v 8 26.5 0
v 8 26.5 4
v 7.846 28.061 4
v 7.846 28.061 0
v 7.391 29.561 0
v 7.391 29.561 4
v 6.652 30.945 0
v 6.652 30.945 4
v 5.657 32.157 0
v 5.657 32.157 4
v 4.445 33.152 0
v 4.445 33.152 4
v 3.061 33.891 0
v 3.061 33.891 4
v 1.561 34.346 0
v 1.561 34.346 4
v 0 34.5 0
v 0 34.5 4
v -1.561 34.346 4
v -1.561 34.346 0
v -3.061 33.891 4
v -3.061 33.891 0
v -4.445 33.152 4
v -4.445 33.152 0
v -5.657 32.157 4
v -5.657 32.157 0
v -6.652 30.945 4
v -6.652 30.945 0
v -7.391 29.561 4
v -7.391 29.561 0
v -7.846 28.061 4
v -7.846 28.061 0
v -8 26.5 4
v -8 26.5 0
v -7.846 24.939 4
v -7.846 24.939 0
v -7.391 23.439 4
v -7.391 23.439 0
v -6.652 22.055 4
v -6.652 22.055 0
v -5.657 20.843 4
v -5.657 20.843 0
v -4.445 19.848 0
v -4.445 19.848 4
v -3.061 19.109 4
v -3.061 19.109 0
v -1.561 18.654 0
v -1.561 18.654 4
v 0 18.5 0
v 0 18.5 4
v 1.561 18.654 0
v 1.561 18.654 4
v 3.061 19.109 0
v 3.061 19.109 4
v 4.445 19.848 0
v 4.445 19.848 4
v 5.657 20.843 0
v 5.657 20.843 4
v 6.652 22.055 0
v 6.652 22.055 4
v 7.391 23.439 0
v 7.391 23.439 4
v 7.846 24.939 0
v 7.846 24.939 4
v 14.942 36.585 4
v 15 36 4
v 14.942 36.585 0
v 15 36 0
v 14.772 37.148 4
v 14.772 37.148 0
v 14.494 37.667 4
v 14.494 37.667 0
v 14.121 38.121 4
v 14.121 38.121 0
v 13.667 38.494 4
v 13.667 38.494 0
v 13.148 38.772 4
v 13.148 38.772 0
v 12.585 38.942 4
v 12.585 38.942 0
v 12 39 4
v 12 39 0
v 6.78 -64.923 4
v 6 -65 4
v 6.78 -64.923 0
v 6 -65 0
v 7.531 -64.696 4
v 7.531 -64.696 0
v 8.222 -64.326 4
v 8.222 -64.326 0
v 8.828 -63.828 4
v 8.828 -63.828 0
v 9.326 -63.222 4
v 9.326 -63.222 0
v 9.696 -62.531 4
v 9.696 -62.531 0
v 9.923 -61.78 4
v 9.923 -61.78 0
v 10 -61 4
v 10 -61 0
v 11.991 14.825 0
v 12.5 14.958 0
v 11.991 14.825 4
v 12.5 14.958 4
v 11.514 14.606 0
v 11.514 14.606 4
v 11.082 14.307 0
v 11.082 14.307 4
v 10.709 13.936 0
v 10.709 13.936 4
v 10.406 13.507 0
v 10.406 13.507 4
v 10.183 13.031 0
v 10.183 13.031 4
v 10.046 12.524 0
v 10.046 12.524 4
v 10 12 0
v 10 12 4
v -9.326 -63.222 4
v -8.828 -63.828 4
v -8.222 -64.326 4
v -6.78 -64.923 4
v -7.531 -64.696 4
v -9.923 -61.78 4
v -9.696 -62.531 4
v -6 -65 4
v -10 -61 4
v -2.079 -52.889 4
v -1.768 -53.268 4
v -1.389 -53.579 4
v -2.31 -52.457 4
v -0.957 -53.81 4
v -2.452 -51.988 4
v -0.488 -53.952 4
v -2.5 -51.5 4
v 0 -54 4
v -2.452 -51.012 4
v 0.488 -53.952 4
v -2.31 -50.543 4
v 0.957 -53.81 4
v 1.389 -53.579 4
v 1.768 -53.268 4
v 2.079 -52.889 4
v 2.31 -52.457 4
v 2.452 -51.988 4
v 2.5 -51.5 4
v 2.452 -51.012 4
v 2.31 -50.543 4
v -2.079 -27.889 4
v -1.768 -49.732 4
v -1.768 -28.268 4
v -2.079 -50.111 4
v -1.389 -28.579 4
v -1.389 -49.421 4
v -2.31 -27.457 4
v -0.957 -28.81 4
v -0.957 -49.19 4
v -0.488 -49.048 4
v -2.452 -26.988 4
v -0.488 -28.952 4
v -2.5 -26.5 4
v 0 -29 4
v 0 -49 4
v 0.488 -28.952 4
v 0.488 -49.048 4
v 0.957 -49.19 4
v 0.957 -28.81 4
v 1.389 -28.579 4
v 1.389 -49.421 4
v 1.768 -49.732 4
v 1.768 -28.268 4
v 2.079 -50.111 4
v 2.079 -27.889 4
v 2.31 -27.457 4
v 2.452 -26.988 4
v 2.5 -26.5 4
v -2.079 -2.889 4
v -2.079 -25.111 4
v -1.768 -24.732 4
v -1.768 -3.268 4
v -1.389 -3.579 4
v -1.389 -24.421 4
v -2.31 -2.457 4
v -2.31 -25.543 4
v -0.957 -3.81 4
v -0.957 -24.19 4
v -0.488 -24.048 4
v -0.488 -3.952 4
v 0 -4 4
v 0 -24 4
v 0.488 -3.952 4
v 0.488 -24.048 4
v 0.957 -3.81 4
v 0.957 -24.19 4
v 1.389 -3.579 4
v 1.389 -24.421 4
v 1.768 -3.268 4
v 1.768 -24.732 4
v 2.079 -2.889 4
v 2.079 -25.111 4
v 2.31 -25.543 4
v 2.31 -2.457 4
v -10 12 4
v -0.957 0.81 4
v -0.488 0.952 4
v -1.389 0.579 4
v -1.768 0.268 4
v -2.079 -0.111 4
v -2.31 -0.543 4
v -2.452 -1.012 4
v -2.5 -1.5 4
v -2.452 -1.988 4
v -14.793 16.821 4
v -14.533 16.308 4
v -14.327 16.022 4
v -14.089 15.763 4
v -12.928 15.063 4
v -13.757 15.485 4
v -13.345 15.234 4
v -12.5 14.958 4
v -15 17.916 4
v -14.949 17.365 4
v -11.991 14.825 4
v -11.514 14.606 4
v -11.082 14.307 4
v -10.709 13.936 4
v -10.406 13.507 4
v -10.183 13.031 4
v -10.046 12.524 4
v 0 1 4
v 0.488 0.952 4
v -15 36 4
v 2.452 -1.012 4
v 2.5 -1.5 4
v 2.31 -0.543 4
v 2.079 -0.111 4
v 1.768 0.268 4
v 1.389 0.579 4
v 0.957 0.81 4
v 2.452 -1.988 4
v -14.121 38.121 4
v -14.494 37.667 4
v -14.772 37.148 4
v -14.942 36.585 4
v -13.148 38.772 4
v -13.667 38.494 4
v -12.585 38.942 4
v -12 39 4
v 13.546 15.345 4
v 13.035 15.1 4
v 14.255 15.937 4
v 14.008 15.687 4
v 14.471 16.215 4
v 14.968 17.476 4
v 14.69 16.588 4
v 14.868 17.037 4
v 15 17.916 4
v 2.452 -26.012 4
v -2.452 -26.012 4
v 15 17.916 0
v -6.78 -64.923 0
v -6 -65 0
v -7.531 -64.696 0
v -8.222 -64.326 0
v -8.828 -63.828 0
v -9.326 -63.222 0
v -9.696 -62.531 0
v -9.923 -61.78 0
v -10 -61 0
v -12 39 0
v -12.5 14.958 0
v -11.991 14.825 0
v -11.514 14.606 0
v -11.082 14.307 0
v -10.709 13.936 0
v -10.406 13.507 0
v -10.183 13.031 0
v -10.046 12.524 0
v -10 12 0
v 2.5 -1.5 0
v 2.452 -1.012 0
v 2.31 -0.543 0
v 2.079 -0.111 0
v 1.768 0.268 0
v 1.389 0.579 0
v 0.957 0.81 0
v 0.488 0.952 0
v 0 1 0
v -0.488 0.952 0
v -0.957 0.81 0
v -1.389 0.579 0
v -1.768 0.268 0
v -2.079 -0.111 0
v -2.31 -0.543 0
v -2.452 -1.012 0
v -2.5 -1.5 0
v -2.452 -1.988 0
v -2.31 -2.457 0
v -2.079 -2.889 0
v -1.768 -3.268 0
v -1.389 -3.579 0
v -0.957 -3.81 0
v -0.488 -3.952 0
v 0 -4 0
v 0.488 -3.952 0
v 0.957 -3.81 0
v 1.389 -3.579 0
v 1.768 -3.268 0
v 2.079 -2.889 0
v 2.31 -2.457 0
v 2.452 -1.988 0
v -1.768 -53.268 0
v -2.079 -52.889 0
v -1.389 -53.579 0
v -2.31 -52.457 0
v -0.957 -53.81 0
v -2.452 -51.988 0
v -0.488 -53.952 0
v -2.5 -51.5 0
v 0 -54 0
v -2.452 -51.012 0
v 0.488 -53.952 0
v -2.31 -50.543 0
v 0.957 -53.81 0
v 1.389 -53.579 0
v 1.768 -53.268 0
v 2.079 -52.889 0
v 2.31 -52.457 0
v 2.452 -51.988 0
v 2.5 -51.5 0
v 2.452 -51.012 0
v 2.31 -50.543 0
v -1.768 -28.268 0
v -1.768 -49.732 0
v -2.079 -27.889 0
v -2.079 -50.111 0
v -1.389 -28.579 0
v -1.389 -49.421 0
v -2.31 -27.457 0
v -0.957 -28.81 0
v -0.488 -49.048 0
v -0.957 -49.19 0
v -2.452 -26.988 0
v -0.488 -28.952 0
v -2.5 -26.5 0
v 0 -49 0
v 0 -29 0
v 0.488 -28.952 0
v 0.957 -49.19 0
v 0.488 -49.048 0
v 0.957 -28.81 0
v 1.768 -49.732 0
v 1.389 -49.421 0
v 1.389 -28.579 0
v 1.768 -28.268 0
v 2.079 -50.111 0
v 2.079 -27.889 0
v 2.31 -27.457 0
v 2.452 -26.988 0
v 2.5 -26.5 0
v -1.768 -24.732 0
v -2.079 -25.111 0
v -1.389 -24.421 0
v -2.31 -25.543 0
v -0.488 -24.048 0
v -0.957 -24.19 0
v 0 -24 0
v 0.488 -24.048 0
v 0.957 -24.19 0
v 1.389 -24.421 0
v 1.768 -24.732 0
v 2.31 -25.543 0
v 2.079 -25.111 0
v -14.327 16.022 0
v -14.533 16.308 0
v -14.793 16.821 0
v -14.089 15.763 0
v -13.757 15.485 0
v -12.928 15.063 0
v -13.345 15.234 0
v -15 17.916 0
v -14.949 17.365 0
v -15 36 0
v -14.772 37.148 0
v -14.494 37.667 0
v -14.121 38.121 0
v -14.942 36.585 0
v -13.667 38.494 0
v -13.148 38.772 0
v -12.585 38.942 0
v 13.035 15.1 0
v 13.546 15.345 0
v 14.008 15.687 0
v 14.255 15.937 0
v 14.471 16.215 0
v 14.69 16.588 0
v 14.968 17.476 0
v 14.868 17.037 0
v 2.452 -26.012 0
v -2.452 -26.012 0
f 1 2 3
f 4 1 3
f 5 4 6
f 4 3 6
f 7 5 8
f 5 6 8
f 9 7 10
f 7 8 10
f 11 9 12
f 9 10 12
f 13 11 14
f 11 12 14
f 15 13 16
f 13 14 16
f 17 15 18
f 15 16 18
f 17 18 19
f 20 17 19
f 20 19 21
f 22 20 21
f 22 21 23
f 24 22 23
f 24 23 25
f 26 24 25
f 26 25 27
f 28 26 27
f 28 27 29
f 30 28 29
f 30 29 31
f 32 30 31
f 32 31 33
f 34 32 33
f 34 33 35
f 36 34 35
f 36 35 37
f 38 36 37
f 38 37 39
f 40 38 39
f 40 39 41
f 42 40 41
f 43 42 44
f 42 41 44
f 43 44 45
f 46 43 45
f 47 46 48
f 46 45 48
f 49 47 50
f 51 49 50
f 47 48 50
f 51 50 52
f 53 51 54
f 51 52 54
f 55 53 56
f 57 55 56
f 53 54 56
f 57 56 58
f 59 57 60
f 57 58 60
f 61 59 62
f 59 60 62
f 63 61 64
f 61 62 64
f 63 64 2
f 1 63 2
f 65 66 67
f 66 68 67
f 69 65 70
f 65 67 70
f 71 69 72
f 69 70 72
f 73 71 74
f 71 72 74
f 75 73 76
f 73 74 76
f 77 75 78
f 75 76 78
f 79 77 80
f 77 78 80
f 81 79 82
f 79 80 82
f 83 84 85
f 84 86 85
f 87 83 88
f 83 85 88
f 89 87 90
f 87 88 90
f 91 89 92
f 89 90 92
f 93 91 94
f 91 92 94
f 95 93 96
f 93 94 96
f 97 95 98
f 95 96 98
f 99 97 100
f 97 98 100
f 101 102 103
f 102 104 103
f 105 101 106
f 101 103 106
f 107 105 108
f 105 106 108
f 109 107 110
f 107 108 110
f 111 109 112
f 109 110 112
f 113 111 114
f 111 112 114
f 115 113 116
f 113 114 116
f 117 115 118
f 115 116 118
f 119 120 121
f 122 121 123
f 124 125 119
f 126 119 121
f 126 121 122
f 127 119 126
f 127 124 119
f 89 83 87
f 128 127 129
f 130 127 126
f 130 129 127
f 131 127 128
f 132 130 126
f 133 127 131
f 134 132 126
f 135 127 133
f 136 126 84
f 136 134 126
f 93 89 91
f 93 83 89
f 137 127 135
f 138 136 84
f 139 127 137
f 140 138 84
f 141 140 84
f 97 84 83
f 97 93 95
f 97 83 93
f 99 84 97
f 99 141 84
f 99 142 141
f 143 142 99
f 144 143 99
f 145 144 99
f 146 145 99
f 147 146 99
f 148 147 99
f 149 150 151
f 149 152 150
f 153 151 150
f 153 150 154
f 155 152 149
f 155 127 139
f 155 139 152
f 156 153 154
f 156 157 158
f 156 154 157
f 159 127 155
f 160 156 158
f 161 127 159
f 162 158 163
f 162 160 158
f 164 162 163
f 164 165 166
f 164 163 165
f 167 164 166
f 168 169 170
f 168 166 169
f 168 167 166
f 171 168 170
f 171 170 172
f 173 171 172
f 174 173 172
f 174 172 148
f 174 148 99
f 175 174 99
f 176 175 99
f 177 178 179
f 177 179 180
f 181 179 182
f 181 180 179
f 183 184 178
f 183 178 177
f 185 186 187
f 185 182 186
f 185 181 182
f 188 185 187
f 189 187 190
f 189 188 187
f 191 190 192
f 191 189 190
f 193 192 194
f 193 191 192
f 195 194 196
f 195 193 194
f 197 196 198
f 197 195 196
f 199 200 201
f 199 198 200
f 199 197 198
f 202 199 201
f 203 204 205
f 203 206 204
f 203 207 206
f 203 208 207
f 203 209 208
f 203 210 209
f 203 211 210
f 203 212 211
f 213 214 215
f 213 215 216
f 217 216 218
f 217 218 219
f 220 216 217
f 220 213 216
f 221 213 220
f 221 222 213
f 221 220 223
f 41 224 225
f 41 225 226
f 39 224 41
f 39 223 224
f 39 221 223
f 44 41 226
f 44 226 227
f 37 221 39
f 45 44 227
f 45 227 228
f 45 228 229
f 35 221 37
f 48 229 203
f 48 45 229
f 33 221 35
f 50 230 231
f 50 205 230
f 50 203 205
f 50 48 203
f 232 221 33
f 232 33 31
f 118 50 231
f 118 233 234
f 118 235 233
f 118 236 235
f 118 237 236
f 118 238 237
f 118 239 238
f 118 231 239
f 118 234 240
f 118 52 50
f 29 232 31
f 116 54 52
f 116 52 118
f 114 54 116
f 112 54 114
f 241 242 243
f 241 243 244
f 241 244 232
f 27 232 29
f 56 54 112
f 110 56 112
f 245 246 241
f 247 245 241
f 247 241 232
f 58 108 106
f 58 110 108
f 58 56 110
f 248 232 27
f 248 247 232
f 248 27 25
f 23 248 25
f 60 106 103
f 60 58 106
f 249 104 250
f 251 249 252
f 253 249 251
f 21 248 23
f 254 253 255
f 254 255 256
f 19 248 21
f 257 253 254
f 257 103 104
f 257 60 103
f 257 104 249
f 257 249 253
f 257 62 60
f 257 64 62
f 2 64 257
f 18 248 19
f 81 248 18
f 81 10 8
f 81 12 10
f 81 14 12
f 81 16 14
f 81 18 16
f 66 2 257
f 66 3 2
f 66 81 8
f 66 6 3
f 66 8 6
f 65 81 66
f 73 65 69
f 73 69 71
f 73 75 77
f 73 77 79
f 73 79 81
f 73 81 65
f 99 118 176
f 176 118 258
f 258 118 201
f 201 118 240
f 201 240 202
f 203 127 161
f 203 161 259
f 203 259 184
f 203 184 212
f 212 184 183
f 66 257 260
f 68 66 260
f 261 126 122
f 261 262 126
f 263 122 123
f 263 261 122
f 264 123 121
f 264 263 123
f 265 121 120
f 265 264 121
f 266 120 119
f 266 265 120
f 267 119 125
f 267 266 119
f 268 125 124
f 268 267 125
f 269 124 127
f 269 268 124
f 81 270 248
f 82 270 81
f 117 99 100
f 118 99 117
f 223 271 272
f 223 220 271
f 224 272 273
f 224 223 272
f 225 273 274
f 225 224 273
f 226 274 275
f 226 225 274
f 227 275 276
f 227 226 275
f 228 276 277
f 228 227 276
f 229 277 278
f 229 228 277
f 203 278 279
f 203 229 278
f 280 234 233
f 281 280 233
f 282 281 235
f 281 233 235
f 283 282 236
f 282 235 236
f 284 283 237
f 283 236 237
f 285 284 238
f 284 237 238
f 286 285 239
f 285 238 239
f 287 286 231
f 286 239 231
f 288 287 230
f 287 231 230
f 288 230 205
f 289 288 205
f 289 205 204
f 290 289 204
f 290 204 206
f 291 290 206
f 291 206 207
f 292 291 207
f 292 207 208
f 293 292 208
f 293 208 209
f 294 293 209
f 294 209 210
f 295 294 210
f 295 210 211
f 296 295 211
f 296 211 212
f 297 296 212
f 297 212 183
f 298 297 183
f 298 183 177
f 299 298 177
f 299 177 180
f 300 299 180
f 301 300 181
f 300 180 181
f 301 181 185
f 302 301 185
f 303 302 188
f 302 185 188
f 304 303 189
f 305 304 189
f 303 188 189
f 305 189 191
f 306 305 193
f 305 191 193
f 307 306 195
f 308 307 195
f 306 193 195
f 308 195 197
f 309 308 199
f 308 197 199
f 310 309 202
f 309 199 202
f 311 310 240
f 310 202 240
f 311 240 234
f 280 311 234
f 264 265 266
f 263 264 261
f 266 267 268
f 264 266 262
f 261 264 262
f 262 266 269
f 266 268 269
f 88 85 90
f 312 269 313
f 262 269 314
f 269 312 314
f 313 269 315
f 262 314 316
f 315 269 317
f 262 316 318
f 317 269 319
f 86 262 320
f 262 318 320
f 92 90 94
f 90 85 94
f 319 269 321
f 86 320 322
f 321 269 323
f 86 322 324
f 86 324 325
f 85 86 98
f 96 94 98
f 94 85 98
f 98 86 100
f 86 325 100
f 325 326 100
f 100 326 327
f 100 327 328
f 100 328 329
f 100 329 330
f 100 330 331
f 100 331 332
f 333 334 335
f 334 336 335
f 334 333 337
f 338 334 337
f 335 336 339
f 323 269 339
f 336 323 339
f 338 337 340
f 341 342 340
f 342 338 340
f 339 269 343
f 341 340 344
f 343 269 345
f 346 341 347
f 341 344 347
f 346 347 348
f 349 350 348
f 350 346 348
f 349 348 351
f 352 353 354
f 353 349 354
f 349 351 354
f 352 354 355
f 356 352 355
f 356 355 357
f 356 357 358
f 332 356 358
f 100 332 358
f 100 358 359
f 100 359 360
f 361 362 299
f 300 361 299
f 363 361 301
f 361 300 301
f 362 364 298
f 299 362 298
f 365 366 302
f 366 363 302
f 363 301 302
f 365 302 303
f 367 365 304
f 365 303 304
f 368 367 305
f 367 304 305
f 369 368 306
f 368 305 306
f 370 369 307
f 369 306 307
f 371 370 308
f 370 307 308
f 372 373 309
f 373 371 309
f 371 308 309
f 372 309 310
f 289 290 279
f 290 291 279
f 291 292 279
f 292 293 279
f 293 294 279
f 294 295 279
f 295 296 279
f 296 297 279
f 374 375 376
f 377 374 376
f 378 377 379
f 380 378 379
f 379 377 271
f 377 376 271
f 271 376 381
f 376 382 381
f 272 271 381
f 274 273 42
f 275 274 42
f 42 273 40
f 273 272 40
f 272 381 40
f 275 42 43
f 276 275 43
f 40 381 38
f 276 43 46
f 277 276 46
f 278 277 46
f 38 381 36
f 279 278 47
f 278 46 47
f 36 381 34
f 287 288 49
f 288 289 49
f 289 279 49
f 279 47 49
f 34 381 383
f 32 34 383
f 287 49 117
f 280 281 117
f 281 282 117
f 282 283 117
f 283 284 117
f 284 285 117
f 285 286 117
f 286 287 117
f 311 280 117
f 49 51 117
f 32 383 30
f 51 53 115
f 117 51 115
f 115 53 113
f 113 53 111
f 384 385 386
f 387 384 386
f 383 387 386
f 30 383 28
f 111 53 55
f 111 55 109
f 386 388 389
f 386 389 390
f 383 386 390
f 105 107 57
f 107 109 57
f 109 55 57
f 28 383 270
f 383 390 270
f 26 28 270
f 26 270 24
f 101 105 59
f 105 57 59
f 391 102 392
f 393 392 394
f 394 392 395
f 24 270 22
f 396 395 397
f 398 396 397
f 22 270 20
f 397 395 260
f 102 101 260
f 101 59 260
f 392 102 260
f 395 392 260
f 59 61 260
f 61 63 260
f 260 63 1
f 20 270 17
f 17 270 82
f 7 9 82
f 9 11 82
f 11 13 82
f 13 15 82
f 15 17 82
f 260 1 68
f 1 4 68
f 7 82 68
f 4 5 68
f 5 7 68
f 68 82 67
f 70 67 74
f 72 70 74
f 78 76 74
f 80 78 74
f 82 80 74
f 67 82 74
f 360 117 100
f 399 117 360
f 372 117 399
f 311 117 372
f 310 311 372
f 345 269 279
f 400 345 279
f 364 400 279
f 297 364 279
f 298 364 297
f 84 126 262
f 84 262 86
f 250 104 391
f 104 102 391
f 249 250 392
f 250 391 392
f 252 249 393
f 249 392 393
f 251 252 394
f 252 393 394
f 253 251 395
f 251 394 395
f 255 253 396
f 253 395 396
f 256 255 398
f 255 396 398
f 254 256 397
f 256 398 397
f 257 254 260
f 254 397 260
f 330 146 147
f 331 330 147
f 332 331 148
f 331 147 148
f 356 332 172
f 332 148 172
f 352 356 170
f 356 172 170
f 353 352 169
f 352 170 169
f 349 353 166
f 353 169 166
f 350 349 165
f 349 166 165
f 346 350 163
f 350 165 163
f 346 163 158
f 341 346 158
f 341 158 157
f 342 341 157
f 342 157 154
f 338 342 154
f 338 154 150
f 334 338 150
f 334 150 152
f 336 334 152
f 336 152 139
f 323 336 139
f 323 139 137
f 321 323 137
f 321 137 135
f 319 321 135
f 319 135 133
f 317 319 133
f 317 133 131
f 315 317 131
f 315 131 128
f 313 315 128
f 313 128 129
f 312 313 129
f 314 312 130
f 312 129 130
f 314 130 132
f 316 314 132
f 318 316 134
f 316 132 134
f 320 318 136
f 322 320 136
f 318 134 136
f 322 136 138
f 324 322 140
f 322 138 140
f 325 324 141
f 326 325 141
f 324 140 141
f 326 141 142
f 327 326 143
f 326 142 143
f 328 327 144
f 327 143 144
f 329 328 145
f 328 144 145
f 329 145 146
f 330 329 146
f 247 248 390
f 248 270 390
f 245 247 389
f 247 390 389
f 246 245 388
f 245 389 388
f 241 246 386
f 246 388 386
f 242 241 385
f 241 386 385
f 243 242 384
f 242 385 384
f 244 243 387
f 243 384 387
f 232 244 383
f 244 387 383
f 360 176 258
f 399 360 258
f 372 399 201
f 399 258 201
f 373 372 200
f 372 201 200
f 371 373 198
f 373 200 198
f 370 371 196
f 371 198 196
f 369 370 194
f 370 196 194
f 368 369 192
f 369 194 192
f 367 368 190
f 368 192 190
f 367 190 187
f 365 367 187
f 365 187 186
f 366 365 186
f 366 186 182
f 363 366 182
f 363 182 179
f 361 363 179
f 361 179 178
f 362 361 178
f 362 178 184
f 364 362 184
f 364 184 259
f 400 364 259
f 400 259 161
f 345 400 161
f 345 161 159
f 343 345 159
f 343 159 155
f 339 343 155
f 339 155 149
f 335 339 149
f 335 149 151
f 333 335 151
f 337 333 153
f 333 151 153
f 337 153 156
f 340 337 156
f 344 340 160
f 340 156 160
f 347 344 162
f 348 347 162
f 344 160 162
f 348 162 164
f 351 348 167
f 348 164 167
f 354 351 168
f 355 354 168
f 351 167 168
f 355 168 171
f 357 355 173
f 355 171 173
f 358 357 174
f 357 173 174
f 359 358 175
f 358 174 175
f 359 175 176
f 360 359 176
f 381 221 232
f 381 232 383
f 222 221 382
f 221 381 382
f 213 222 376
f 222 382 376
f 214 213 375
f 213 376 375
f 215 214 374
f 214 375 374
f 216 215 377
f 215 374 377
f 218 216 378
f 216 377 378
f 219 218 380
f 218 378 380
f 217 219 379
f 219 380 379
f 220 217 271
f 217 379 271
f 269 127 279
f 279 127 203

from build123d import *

# Parameters (mm, degrees)
SKETCH_1_W          = 20
SKETCH_1_H          = 30
SKETCH_1_R          = 1.5
EXTRUDE_1_DEPTH     = 4
SKETCH_2_W          = 30
SKETCH_2_H          = 4
EXTRUDE_2_DEPTH     = 24
FILLET_1_R          = 3
SKETCH_3_R          = 8
CUT_EXTRUDE_1_DEPTH = 24
FILLET_2_R          = 3
SKETCH_4_R          = 1.5
EXTRUDE_3_DEPTH     = 4
SKETCH_9_R          = 2.5
CUT_EXTRUDE_2_DEPTH = 5.0000001
SKETCH_11_W         = 20
SKETCH_11_H         = 50
EXTRUDE_5_DEPTH     = 4
SKETCH_13_R         = 2.5
CUT_EXTRUDE_3_DEPTH = 10
FILLET_4_R          = 4
FILLET_5_R          = 4


with BuildPart() as part:
    # 草图1 → 凸台-拉伸1 (new body)
    with BuildSketch(Plane.XY):
        Rectangle(SKETCH_1_W, SKETCH_1_H)
        with Locations((-5, 3)):
            Circle(SKETCH_1_R, mode=Mode.SUBTRACT)
        with Locations((5, 3)):
            Circle(SKETCH_1_R, mode=Mode.SUBTRACT)
        with Locations((-5, -7)):
            Circle(SKETCH_1_R, mode=Mode.SUBTRACT)
        with Locations((5, -7)):
            Circle(SKETCH_1_R, mode=Mode.SUBTRACT)
    extrude(amount=EXTRUDE_1_DEPTH)

    # 草图2 → 凸台-拉伸2 (add)
    with BuildSketch(Plane(origin=(0, 15, 0), x_dir=(1, 0, 0), z_dir=(0, 1, 0))):
        with Locations((0, -2)):
            Rectangle(SKETCH_2_W, SKETCH_2_H)
    extrude(amount=EXTRUDE_2_DEPTH)

    # 圆角1
    fillet_1_edges = [part.edges().sort_by_distance(p)[0] for p in [
        (-10, 15, 2),
        (10, 15, 2),
    ]]
    fillet(fillet_1_edges, radius=FILLET_1_R)

    # 草图3 → 切除-拉伸1 (cut)
    with BuildSketch(Plane.XY.offset(4)):
        with Locations((0, 26.5)):
            Circle(SKETCH_3_R)
    extrude(amount=-CUT_EXTRUDE_1_DEPTH, mode=Mode.SUBTRACT)

    # 圆角2
    fillet_2_edges = [part.edges().sort_by_distance(p)[0] for p in [
        (15, 15, 2),
        (15, 39, 2),
        (-15, 39, 2),
        (-15, 15, 2),
    ]]
    fillet(fillet_2_edges, radius=FILLET_2_R)

    # 草图4 → 凸台-拉伸3 (add)
    with BuildSketch(Plane.XY.offset(4)):
        with Locations((5, 3)):
            Circle(SKETCH_4_R)
        with Locations((5, -7)):
            Circle(SKETCH_4_R)
        with Locations((-5, 3)):
            Circle(SKETCH_4_R)
        with Locations((-5, -7)):
            Circle(SKETCH_4_R)
    extrude(amount=-EXTRUDE_3_DEPTH)

    # 草图9 → 切除-拉伸2 (cut, through all)
    with BuildSketch(Plane.XY.offset(4)):
        with Locations((0, -1.5)):
            Circle(SKETCH_9_R)
    extrude(amount=-CUT_EXTRUDE_2_DEPTH, mode=Mode.SUBTRACT)

    # 草图11 → 凸台-拉伸5 (add)
    with BuildSketch(Plane.XY.offset(4)):
        with Locations((0, -40)):
            Rectangle(SKETCH_11_W, SKETCH_11_H)
    extrude(amount=-EXTRUDE_5_DEPTH)

    # 草图13 → 切除-拉伸3 (cut)
    with BuildSketch(Plane.XY.offset(4)):
        with Locations((0, -26.5)):
            Circle(SKETCH_13_R)
        with Locations((0, -51.5)):
            Circle(SKETCH_13_R)
    extrude(amount=-CUT_EXTRUDE_3_DEPTH, mode=Mode.SUBTRACT)

    # 圆角4
    fillet_4_edges = [part.edges().sort_by_distance(p)[0] for p in [
        (10, -65, 2),
    ]]
    fillet(fillet_4_edges, radius=FILLET_4_R)

    # 圆角5
    fillet_5_edges = [part.edges().sort_by_distance(p)[0] for p in [
        (-10, -65, 2),
    ]]
    fillet(fillet_5_edges, radius=FILLET_5_R)


solid = part.part
